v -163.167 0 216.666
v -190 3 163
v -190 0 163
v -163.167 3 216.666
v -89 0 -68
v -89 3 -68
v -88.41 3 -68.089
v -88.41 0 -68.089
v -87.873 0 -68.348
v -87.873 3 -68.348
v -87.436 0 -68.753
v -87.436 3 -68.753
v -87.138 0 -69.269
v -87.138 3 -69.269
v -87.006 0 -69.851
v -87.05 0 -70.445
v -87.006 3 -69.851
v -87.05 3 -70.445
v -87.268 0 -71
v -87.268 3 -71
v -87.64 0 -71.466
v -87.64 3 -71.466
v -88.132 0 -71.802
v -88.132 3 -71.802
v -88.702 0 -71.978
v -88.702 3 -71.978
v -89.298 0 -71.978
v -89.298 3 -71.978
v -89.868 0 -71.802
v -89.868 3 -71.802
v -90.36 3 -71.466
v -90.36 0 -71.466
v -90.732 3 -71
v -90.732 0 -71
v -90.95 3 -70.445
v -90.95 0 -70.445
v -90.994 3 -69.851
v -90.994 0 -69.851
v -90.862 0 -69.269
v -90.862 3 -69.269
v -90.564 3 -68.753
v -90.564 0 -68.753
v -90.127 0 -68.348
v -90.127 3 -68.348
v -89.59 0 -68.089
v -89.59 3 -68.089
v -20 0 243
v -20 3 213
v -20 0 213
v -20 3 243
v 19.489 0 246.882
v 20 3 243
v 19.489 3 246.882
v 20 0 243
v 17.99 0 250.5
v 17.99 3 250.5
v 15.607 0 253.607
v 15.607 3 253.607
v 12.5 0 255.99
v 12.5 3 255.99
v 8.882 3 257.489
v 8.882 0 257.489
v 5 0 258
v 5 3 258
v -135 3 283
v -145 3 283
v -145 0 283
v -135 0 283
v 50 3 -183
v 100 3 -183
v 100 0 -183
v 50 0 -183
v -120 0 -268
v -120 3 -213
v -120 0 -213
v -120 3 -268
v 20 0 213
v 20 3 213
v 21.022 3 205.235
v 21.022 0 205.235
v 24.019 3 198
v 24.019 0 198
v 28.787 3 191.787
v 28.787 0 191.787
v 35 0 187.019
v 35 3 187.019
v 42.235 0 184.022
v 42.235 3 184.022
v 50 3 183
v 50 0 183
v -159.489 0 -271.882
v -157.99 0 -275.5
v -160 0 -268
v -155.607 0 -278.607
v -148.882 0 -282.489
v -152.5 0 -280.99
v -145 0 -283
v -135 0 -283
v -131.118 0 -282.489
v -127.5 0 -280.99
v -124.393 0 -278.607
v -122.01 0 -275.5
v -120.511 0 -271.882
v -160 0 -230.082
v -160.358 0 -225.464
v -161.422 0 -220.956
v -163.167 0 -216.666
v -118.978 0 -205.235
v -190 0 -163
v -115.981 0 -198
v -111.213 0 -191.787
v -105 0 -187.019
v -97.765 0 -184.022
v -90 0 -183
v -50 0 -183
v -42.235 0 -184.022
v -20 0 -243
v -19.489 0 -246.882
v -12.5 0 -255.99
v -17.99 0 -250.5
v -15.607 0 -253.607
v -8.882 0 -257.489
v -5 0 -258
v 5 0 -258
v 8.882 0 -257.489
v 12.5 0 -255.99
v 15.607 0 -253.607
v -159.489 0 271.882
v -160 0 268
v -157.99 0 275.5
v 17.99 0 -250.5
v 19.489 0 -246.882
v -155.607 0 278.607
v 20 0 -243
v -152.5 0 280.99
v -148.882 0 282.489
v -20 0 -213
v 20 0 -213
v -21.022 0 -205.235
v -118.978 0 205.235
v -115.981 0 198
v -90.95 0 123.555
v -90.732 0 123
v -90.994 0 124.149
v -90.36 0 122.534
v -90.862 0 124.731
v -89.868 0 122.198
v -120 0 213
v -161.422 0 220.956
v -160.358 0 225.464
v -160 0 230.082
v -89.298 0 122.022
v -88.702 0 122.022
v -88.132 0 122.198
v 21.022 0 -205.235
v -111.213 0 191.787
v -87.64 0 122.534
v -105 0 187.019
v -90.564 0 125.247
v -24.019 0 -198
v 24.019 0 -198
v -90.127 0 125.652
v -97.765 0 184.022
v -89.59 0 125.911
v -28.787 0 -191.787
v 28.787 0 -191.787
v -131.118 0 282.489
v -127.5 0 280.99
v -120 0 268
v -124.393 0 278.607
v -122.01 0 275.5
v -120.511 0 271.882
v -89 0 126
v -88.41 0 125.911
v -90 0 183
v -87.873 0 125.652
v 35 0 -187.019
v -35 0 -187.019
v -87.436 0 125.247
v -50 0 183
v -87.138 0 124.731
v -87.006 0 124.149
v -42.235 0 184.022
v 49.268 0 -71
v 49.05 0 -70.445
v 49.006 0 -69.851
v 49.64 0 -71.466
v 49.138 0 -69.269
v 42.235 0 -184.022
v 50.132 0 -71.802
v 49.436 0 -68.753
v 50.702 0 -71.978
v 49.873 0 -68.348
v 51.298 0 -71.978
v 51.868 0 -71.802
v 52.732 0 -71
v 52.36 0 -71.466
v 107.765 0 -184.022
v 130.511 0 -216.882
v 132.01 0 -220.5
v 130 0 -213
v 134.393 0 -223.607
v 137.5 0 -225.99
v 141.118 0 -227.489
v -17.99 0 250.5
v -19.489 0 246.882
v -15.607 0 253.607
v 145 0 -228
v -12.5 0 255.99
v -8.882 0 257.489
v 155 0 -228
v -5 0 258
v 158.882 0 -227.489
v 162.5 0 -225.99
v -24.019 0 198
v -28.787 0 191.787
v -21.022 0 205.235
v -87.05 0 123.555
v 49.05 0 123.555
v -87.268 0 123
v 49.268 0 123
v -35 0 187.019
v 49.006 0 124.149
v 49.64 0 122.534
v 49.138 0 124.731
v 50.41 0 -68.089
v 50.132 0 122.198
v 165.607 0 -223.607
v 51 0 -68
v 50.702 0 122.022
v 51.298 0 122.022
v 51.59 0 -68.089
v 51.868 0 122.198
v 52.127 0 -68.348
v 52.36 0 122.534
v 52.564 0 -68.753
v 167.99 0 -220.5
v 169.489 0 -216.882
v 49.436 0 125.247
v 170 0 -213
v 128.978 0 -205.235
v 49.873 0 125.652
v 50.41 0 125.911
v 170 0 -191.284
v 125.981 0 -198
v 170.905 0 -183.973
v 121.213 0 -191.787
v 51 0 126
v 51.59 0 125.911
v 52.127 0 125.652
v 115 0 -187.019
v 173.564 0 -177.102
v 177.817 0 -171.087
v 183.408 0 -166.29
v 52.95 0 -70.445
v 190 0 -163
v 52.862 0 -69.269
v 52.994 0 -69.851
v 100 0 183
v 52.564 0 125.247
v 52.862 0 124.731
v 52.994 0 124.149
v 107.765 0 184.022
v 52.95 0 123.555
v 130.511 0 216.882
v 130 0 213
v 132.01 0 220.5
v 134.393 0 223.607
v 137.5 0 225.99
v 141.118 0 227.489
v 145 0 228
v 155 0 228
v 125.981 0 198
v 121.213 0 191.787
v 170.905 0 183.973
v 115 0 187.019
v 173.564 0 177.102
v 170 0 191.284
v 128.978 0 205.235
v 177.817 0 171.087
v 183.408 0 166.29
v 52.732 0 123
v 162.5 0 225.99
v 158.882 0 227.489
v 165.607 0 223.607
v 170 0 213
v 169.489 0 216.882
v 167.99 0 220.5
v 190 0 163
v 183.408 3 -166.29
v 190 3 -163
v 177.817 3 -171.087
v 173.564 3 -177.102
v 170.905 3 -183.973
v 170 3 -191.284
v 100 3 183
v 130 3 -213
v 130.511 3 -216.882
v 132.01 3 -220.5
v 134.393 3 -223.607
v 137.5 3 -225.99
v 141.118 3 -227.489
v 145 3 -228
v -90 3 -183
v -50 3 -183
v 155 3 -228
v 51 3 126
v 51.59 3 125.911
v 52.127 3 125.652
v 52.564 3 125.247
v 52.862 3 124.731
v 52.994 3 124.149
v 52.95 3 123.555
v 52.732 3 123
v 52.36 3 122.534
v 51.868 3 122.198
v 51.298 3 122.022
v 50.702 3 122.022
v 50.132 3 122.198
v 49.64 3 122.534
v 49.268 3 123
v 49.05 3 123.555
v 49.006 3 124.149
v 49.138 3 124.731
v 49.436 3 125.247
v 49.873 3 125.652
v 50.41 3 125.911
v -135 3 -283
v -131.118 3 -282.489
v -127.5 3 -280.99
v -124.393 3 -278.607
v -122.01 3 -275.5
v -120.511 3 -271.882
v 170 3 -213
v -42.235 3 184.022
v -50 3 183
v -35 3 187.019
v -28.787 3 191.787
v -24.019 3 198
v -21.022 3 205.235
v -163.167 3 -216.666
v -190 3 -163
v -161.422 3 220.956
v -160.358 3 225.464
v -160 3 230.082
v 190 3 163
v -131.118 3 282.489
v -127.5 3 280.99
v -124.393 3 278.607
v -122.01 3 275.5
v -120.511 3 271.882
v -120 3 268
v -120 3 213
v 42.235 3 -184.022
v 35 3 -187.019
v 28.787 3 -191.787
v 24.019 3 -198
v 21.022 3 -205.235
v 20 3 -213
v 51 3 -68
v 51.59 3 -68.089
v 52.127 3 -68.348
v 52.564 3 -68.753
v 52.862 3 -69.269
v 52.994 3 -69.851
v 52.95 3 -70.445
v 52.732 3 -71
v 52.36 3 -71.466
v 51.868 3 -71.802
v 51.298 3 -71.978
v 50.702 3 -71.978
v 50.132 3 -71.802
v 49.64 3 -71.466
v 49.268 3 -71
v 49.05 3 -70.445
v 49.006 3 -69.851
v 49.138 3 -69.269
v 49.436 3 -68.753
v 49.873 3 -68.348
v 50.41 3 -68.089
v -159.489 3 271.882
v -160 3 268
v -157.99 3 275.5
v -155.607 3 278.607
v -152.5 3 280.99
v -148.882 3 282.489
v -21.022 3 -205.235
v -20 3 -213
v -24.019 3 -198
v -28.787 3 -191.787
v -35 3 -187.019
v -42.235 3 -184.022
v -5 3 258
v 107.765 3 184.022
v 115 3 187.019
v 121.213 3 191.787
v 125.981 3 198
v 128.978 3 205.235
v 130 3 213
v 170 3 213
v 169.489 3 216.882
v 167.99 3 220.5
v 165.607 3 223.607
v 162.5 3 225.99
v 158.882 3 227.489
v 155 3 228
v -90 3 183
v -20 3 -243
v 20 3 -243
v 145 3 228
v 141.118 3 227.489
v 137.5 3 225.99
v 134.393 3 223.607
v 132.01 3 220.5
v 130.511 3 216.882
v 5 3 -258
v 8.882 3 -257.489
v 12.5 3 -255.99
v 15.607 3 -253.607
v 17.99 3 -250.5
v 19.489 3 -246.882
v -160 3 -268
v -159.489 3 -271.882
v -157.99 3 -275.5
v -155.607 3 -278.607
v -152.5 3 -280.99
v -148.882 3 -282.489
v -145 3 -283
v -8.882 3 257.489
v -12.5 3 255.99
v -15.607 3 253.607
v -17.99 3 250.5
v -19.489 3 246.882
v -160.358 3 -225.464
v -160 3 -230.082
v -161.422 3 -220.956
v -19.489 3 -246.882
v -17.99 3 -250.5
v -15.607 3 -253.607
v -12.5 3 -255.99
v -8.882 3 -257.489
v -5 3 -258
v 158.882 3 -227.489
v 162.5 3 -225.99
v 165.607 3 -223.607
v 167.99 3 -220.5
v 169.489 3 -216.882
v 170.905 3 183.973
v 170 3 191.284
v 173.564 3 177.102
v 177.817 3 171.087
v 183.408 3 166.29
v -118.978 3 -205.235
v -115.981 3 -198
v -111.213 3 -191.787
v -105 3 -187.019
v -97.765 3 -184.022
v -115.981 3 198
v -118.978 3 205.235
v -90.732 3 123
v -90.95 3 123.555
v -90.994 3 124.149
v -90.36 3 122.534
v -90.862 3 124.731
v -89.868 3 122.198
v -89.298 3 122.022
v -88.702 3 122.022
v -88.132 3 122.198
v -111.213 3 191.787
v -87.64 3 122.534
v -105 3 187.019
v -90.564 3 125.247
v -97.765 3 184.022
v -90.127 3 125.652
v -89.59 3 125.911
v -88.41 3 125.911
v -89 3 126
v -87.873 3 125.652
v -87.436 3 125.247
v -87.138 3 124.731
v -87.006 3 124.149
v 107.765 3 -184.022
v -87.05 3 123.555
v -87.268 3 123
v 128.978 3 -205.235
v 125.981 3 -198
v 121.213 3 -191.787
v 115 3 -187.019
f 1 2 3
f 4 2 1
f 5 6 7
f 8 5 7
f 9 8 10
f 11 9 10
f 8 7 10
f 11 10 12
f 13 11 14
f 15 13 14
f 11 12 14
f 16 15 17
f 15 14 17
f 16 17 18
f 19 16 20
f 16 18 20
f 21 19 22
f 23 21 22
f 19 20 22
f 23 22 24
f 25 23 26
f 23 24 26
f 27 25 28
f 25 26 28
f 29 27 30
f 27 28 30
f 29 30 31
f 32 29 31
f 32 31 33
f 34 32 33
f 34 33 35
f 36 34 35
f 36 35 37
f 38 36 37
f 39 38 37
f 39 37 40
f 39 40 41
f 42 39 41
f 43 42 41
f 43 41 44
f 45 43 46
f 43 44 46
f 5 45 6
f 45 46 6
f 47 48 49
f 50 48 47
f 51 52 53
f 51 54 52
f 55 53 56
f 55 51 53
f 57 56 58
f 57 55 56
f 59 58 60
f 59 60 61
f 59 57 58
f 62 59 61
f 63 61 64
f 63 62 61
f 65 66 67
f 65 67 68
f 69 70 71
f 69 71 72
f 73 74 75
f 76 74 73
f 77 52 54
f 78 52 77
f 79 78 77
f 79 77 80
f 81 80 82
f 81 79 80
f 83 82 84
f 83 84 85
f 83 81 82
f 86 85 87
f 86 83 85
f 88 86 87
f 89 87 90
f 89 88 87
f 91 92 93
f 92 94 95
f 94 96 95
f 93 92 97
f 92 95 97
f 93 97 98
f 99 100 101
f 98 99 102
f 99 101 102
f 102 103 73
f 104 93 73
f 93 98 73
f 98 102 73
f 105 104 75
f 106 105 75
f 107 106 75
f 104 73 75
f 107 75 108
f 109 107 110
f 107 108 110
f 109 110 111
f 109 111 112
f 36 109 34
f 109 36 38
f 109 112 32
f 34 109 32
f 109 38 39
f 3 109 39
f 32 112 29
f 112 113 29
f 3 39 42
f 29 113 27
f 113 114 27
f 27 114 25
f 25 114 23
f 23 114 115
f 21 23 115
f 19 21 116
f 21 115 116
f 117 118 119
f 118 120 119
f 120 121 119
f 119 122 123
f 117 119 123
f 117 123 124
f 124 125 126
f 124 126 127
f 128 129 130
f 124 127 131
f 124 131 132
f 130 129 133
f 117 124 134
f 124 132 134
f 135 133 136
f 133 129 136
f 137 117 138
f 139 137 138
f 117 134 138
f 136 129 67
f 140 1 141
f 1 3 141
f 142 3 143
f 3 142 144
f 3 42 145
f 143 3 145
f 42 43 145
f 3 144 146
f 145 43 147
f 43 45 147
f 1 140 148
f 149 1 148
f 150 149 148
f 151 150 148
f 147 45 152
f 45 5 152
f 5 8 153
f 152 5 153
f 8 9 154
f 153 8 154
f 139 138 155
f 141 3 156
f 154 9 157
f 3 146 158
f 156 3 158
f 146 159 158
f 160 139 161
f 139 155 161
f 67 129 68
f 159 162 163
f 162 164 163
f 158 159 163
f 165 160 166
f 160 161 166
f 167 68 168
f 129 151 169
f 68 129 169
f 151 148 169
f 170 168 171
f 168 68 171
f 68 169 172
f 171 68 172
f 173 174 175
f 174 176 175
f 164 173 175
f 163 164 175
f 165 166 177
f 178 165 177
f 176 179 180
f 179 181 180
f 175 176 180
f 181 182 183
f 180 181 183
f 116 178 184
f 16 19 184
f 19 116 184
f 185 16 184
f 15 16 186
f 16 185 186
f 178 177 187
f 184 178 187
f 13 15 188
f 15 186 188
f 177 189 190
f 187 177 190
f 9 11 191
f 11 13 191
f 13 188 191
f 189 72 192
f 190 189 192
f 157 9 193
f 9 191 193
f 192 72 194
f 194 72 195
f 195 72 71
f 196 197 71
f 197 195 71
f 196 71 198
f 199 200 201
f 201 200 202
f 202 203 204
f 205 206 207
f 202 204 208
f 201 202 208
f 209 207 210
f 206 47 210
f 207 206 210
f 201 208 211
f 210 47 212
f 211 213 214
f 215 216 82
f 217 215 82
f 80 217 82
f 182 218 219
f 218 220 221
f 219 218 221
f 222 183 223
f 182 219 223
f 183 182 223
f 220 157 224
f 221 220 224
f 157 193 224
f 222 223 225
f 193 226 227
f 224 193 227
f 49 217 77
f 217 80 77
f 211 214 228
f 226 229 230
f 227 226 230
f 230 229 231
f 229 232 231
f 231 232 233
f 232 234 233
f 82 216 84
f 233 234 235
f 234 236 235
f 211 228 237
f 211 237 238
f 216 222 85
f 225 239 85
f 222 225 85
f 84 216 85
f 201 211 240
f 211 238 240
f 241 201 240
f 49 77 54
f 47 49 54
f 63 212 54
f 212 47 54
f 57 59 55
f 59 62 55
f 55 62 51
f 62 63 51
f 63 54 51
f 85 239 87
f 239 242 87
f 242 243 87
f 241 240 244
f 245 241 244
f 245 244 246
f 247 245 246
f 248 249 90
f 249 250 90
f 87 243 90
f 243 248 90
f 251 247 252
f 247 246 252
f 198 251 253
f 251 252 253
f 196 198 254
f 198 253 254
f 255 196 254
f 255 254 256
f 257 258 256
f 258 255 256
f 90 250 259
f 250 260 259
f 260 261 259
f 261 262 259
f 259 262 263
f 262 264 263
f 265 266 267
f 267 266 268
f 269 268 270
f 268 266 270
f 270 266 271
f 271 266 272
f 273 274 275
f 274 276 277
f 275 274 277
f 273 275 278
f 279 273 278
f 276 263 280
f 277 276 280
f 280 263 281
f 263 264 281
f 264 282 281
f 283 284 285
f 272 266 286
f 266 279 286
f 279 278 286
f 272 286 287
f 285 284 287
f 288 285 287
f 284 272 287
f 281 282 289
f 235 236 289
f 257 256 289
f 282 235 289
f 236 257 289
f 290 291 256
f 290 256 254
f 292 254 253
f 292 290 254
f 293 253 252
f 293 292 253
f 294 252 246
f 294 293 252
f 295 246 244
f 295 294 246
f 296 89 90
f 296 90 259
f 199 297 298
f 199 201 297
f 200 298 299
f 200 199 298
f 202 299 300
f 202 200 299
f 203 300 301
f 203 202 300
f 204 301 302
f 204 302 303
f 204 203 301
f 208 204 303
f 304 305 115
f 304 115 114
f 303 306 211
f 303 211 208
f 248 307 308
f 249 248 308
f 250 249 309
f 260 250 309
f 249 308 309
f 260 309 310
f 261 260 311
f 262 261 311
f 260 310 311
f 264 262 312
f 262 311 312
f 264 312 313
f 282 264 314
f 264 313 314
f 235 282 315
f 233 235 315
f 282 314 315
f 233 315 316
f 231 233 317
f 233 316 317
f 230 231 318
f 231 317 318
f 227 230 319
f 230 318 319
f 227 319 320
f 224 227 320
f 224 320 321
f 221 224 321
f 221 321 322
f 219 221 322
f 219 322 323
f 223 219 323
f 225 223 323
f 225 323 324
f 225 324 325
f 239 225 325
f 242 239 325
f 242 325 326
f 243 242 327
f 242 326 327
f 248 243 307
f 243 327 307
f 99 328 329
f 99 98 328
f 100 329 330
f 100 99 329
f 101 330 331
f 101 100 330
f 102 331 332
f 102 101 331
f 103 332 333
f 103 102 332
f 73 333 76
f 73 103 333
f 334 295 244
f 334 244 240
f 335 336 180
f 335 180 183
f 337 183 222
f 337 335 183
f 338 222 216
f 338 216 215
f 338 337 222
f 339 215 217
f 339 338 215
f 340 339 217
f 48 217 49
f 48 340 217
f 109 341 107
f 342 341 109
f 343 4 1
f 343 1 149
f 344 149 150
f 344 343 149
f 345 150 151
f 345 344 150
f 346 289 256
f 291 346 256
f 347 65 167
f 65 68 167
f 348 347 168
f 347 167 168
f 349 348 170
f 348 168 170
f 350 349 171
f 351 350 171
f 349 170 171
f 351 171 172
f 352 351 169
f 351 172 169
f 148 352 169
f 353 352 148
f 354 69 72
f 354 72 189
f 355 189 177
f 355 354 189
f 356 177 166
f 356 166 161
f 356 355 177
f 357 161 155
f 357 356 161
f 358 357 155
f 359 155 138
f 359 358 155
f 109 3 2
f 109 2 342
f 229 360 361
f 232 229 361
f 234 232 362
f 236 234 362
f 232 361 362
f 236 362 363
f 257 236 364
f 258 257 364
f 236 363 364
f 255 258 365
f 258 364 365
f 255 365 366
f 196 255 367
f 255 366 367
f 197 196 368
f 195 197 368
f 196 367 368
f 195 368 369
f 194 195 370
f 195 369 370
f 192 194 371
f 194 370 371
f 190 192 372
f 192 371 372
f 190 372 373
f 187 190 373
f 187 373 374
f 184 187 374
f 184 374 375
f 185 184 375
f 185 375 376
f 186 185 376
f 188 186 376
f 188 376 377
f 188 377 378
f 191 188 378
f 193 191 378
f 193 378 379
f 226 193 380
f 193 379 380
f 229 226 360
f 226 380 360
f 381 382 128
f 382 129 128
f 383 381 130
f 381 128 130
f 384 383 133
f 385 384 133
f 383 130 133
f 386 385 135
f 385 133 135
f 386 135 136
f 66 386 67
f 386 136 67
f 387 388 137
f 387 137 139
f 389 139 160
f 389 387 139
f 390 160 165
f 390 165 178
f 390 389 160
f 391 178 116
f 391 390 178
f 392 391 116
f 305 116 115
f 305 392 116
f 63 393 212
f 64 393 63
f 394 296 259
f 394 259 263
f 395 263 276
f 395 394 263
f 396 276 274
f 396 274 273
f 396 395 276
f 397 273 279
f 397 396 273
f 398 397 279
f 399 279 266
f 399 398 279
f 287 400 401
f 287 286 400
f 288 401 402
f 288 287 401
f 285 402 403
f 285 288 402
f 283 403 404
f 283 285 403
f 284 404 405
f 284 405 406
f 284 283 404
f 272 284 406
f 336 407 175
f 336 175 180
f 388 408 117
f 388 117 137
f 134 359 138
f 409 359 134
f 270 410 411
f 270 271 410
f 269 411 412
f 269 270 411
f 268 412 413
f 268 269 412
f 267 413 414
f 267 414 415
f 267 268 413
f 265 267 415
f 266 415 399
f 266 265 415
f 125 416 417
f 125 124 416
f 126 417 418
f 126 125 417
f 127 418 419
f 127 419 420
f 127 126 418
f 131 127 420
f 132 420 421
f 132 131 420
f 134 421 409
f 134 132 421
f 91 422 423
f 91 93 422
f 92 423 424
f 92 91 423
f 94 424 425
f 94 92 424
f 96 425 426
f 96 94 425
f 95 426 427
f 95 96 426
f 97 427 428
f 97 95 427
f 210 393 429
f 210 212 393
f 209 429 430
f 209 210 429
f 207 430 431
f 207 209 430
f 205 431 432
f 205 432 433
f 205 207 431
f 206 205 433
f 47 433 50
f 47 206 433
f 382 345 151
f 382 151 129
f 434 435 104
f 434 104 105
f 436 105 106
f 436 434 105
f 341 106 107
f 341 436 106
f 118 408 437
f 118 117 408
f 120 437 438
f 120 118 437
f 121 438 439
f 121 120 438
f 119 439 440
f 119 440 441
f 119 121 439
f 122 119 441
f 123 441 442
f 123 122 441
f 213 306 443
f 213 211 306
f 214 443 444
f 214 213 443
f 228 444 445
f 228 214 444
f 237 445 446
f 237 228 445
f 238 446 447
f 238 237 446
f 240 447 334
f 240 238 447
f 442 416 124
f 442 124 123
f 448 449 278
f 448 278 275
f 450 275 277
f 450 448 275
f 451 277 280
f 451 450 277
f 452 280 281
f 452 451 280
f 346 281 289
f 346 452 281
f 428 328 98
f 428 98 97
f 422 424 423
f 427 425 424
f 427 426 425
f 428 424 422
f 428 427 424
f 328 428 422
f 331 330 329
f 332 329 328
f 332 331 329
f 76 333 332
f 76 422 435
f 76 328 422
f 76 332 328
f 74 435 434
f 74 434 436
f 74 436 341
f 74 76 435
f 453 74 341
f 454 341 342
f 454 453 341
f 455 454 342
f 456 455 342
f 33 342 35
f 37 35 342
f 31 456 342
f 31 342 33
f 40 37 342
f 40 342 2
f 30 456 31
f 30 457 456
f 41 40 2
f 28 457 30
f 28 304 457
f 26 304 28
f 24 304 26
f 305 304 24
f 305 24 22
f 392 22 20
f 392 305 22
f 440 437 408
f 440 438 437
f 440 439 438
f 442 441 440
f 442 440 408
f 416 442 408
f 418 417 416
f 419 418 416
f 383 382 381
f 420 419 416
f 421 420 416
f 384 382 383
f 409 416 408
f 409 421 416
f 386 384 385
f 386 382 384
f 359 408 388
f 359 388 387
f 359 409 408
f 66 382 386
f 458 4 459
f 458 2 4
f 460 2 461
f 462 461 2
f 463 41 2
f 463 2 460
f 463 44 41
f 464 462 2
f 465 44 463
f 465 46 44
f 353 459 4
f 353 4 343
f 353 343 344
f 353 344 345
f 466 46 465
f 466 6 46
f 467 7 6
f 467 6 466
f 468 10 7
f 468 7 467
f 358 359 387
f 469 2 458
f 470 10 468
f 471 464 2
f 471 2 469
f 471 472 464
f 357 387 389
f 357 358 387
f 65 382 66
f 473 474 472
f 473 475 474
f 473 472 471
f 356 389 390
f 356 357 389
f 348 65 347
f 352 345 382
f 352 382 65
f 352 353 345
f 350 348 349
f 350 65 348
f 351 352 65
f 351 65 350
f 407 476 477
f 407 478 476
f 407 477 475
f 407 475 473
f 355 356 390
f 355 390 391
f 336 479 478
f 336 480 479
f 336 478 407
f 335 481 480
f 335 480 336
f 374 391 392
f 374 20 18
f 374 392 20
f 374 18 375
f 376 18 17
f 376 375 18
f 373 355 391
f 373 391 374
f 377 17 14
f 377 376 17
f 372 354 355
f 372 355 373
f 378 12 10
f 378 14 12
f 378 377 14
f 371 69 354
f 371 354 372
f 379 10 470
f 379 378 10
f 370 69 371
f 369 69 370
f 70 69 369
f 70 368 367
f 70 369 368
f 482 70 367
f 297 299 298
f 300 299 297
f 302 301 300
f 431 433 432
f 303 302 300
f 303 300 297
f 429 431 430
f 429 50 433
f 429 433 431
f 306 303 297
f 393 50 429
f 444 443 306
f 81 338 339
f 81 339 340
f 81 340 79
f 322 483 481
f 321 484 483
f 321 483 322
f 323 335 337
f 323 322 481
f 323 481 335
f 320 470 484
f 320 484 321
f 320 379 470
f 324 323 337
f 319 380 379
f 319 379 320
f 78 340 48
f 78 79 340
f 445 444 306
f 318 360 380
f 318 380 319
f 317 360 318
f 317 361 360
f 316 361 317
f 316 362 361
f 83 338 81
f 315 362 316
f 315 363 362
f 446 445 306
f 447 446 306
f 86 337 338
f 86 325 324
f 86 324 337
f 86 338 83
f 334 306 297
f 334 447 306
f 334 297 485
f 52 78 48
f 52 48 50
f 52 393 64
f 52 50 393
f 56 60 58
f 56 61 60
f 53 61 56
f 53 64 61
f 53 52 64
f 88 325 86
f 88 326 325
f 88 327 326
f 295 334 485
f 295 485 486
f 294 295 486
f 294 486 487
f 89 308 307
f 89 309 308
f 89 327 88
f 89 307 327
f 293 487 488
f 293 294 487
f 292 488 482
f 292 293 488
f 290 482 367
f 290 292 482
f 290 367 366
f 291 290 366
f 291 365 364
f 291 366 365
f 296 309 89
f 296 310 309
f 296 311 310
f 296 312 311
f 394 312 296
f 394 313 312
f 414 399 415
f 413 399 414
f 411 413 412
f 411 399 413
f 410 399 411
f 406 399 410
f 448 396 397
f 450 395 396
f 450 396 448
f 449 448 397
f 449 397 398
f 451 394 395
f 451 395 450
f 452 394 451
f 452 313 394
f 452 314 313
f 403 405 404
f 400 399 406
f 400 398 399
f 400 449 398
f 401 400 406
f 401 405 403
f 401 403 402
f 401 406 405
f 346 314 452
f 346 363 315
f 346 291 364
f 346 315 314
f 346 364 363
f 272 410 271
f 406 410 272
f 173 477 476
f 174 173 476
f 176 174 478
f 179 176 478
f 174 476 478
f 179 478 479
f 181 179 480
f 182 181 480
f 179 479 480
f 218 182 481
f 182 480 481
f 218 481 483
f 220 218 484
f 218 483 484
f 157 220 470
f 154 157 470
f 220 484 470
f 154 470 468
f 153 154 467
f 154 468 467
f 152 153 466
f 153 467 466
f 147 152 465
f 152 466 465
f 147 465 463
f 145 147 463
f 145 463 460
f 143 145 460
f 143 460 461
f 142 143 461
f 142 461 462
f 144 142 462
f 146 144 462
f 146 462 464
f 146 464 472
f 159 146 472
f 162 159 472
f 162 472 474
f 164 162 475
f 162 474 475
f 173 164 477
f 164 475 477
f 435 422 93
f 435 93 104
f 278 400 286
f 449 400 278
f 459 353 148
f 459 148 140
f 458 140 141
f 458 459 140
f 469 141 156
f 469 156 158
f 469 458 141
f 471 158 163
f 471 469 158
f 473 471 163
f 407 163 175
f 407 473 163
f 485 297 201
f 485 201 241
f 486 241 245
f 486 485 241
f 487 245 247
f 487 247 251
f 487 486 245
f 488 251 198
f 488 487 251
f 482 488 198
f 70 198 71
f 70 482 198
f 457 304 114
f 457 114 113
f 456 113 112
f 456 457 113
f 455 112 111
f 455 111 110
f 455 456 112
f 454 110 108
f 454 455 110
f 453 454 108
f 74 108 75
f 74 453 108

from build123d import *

# Parameters (mm, degrees)
SKETCH1_W             = 380
SKETCH1_H             = 326
BOSS_EXTRUDE1_DEPTH   = 3
SKETCH2_R             = 2
PCB_PLATE_HOLES_DEPTH = 3
BOSS_EXTRUDE2_DEPTH   = 3
FILLET1_R             = 30
FILLET2_R             = 15


# Some blends are built 0.0001 mm under size
with BuildPart() as part:
    # Sketch1 → Boss-Extrude1 (new body)
    with BuildSketch(Plane(origin=(0, 0, 0), x_dir=(1, 0, 0), z_dir=(0, 1, 0))):
        Rectangle(SKETCH1_W, SKETCH1_H)
    extrude(amount=BOSS_EXTRUDE1_DEPTH)

    # Sketch2 → PCB Plate Holes (cut)
    with BuildSketch(Plane(origin=(0, 3, 0), x_dir=(1, 0, 0), z_dir=(0, 1, 0))):
        with Locations(Location((51, 70, 0), (0, 0, 270))):
            Circle(SKETCH2_R)
        with Locations(Location((-89, 70, 0), (0, 0, 270))):
            Circle(SKETCH2_R)
        with Locations(Location((51, -124, 0), (0, 0, 270))):
            Circle(SKETCH2_R)
        with Locations(Location((-89, -124, 0), (0, 0, 270))):
            Circle(SKETCH2_R)
    extrude(amount=-PCB_PLATE_HOLES_DEPTH, mode=Mode.SUBTRACT)

    # Sketch3 → Boss-Extrude2 (add)
    with BuildSketch(Plane(origin=(0, 3, 0), x_dir=(1, 0, 0), z_dir=(0, 1, 0))):
        Polygon((170, 163), (170, 228), (130, 228), (130, 183), (20, 183), (20, 258), (-20, 258), (-20, 183), (-120, 183), (-120, 283), (-160, 283), (-160, 223), (-190, 163), align=None)
        Polygon((170, -228), (170, -163), (-190, -163), (-160, -223), (-160, -283), (-120, -283), (-120, -183), (-20, -183), (-20, -258), (20, -258), (20, -183), (130, -183), (130, -228), align=None)
    extrude(amount=-BOSS_EXTRUDE2_DEPTH)

    # Fillet1
    # the kernel refuses this fillet: 30 mm, written as the material it adds along each edge
    with BuildSketch(Plane(origin=(130, 3, -183), x_dir=(0, 0, -1), z_dir=(0, -1, 0)), Plane(origin=(20, 3, -183), x_dir=(1, 0, 0), z_dir=(0, -1, 0)), Plane(origin=(-20, 3, -183), x_dir=(0, 0, -1), z_dir=(0, -1, 0)), Plane(origin=(-120, 3, -183), x_dir=(1, 0, 0), z_dir=(0, -1, 0)), Plane(origin=(20, 3, 183), x_dir=(0, 0, 1), z_dir=(0, -1, 0)), Plane(origin=(130, 3, 183), x_dir=(-1, 0, 0), z_dir=(0, -1, 0)), Plane(origin=(-20, 3, 183), x_dir=(-1, 0, 0), z_dir=(0, -1, 0)), Plane(origin=(-120, 3, 183), x_dir=(0, 0, 1), z_dir=(0, -1, 0))) as fillet1_piece_1:
        with BuildLine():
            CenterArc((FILLET1_R, -FILLET1_R), FILLET1_R, 90, 90)
            Line((0, -FILLET1_R), (-FILLET1_R * 0.02, -FILLET1_R))
            Line((-FILLET1_R * 0.02, -FILLET1_R), (-FILLET1_R * 0.02, FILLET1_R * 0.02))
            Line((-FILLET1_R * 0.02, FILLET1_R * 0.02), (FILLET1_R, FILLET1_R * 0.02))
            Line((FILLET1_R, FILLET1_R * 0.02), (FILLET1_R, 0))
        make_face()
    extrude(amount=3)
    with BuildSketch(Plane(origin=(170, 3, -163), x_dir=(1, 0, 0), z_dir=(0, -1, 0))) as fillet1_piece_2:
        with BuildLine():
            CenterArc((30, -28.284271247), FILLET1_R, 109.471220634, 70.528779366)
            Line((0, -28.284271247), (-0.6, -28.284271247))
            Line((-0.6, -28.284271247), (-0.6, 0))
            Line((-0.6, 0), (0, 0.6))
            ThreePointArc((0, 0.6), (10, 0.6), (19.8, 0.565685425))
            Line((19.8, 0.565685425), (20, 0))
        make_face()
    extrude(amount=3)
    with BuildSketch(Plane(origin=(170, 3, 163), x_dir=(1, 0, 0), z_dir=(0, -1, 0))) as fillet1_piece_3:
        with BuildLine():
            CenterArc((30, 28.284271247), FILLET1_R, 180, 70.528779366)
            Line((0, 28.284271247), (-0.6, 28.284271247))
            Line((-0.6, 28.284271247), (-0.6, 0))
            Line((-0.6, 0), (0, -0.6))
            ThreePointArc((0, -0.6), (10, -0.6), (19.8, -0.565685425))
            Line((19.8, -0.565685425), (20, 0))
        make_face()
    extrude(amount=3)
    with BuildSketch(Plane(origin=(-160, 3, -223), x_dir=(-0.44721359549995476, 0, 0.8944271909999175), z_dir=(0, -1, 0))) as fillet1_piece_4:
        with BuildLine():
            CenterArc((FILLET1_R * 0.2360679775, FILLET1_R), FILLET1_R, 243.434948823, 26.565051177)
            Line((-FILLET1_R * 0.211145618, FILLET1_R * 0.105572809), (-FILLET1_R * 0.22008988991, FILLET1_R * 0.0876842651801))
            Line((-FILLET1_R * 0.22008988991, FILLET1_R * 0.0876842651801), (-FILLET1_R * 0.00472135955, -FILLET1_R * 0.02))
            Line((-FILLET1_R * 0.00472135955, -FILLET1_R * 0.02), (FILLET1_R * 0.2360679775, -FILLET1_R * 0.02))
            Line((FILLET1_R * 0.2360679775, -FILLET1_R * 0.02), (FILLET1_R * 0.2360679775, 0))
        make_face()
    extrude(amount=3)
    with BuildSketch(Plane(origin=(-160, 3, 223), x_dir=(-0.4472135954999563, 0, -0.8944271909999166), z_dir=(0, -1, 0))) as fillet1_piece_5:
        with BuildLine():
            CenterArc((FILLET1_R * 0.2360679775, -FILLET1_R), FILLET1_R, 90, 26.565051177)
            Line((-FILLET1_R * 0.211145618, -FILLET1_R * 0.105572809), (-FILLET1_R * 0.22008988991, -FILLET1_R * 0.0876842651801))
            Line((-FILLET1_R * 0.22008988991, -FILLET1_R * 0.0876842651801), (-FILLET1_R * 0.00472135955, FILLET1_R * 0.02))
            Line((-FILLET1_R * 0.00472135955, FILLET1_R * 0.02), (FILLET1_R * 0.2360679775, FILLET1_R * 0.02))
            Line((FILLET1_R * 0.2360679775, FILLET1_R * 0.02), (FILLET1_R * 0.2360679775, 0))
        make_face()
    extrude(amount=3)

    # Fillet2
    fillet2_edges = [part.edges().sort_by_distance(p)[0] for p in [
        (170, 1.5, 228),
        (130, 1.5, 228),
        (20, 1.5, 258),
        (-120, 1.5, 283),
        (-20, 1.5, 258),
        (170, 1.5, -228),
        (130, 1.5, -228),
        (20, 1.5, -258),
        (-20, 1.5, -258),
        (-120, 1.5, -283),
        (-160, 1.5, -283),
        (-160, 1.5, 283),
    ]]
    fillet(fillet2_edges, radius=FILLET2_R - 0.0001)  # a hair under: the kernel refuses the full size


solid = part.part
